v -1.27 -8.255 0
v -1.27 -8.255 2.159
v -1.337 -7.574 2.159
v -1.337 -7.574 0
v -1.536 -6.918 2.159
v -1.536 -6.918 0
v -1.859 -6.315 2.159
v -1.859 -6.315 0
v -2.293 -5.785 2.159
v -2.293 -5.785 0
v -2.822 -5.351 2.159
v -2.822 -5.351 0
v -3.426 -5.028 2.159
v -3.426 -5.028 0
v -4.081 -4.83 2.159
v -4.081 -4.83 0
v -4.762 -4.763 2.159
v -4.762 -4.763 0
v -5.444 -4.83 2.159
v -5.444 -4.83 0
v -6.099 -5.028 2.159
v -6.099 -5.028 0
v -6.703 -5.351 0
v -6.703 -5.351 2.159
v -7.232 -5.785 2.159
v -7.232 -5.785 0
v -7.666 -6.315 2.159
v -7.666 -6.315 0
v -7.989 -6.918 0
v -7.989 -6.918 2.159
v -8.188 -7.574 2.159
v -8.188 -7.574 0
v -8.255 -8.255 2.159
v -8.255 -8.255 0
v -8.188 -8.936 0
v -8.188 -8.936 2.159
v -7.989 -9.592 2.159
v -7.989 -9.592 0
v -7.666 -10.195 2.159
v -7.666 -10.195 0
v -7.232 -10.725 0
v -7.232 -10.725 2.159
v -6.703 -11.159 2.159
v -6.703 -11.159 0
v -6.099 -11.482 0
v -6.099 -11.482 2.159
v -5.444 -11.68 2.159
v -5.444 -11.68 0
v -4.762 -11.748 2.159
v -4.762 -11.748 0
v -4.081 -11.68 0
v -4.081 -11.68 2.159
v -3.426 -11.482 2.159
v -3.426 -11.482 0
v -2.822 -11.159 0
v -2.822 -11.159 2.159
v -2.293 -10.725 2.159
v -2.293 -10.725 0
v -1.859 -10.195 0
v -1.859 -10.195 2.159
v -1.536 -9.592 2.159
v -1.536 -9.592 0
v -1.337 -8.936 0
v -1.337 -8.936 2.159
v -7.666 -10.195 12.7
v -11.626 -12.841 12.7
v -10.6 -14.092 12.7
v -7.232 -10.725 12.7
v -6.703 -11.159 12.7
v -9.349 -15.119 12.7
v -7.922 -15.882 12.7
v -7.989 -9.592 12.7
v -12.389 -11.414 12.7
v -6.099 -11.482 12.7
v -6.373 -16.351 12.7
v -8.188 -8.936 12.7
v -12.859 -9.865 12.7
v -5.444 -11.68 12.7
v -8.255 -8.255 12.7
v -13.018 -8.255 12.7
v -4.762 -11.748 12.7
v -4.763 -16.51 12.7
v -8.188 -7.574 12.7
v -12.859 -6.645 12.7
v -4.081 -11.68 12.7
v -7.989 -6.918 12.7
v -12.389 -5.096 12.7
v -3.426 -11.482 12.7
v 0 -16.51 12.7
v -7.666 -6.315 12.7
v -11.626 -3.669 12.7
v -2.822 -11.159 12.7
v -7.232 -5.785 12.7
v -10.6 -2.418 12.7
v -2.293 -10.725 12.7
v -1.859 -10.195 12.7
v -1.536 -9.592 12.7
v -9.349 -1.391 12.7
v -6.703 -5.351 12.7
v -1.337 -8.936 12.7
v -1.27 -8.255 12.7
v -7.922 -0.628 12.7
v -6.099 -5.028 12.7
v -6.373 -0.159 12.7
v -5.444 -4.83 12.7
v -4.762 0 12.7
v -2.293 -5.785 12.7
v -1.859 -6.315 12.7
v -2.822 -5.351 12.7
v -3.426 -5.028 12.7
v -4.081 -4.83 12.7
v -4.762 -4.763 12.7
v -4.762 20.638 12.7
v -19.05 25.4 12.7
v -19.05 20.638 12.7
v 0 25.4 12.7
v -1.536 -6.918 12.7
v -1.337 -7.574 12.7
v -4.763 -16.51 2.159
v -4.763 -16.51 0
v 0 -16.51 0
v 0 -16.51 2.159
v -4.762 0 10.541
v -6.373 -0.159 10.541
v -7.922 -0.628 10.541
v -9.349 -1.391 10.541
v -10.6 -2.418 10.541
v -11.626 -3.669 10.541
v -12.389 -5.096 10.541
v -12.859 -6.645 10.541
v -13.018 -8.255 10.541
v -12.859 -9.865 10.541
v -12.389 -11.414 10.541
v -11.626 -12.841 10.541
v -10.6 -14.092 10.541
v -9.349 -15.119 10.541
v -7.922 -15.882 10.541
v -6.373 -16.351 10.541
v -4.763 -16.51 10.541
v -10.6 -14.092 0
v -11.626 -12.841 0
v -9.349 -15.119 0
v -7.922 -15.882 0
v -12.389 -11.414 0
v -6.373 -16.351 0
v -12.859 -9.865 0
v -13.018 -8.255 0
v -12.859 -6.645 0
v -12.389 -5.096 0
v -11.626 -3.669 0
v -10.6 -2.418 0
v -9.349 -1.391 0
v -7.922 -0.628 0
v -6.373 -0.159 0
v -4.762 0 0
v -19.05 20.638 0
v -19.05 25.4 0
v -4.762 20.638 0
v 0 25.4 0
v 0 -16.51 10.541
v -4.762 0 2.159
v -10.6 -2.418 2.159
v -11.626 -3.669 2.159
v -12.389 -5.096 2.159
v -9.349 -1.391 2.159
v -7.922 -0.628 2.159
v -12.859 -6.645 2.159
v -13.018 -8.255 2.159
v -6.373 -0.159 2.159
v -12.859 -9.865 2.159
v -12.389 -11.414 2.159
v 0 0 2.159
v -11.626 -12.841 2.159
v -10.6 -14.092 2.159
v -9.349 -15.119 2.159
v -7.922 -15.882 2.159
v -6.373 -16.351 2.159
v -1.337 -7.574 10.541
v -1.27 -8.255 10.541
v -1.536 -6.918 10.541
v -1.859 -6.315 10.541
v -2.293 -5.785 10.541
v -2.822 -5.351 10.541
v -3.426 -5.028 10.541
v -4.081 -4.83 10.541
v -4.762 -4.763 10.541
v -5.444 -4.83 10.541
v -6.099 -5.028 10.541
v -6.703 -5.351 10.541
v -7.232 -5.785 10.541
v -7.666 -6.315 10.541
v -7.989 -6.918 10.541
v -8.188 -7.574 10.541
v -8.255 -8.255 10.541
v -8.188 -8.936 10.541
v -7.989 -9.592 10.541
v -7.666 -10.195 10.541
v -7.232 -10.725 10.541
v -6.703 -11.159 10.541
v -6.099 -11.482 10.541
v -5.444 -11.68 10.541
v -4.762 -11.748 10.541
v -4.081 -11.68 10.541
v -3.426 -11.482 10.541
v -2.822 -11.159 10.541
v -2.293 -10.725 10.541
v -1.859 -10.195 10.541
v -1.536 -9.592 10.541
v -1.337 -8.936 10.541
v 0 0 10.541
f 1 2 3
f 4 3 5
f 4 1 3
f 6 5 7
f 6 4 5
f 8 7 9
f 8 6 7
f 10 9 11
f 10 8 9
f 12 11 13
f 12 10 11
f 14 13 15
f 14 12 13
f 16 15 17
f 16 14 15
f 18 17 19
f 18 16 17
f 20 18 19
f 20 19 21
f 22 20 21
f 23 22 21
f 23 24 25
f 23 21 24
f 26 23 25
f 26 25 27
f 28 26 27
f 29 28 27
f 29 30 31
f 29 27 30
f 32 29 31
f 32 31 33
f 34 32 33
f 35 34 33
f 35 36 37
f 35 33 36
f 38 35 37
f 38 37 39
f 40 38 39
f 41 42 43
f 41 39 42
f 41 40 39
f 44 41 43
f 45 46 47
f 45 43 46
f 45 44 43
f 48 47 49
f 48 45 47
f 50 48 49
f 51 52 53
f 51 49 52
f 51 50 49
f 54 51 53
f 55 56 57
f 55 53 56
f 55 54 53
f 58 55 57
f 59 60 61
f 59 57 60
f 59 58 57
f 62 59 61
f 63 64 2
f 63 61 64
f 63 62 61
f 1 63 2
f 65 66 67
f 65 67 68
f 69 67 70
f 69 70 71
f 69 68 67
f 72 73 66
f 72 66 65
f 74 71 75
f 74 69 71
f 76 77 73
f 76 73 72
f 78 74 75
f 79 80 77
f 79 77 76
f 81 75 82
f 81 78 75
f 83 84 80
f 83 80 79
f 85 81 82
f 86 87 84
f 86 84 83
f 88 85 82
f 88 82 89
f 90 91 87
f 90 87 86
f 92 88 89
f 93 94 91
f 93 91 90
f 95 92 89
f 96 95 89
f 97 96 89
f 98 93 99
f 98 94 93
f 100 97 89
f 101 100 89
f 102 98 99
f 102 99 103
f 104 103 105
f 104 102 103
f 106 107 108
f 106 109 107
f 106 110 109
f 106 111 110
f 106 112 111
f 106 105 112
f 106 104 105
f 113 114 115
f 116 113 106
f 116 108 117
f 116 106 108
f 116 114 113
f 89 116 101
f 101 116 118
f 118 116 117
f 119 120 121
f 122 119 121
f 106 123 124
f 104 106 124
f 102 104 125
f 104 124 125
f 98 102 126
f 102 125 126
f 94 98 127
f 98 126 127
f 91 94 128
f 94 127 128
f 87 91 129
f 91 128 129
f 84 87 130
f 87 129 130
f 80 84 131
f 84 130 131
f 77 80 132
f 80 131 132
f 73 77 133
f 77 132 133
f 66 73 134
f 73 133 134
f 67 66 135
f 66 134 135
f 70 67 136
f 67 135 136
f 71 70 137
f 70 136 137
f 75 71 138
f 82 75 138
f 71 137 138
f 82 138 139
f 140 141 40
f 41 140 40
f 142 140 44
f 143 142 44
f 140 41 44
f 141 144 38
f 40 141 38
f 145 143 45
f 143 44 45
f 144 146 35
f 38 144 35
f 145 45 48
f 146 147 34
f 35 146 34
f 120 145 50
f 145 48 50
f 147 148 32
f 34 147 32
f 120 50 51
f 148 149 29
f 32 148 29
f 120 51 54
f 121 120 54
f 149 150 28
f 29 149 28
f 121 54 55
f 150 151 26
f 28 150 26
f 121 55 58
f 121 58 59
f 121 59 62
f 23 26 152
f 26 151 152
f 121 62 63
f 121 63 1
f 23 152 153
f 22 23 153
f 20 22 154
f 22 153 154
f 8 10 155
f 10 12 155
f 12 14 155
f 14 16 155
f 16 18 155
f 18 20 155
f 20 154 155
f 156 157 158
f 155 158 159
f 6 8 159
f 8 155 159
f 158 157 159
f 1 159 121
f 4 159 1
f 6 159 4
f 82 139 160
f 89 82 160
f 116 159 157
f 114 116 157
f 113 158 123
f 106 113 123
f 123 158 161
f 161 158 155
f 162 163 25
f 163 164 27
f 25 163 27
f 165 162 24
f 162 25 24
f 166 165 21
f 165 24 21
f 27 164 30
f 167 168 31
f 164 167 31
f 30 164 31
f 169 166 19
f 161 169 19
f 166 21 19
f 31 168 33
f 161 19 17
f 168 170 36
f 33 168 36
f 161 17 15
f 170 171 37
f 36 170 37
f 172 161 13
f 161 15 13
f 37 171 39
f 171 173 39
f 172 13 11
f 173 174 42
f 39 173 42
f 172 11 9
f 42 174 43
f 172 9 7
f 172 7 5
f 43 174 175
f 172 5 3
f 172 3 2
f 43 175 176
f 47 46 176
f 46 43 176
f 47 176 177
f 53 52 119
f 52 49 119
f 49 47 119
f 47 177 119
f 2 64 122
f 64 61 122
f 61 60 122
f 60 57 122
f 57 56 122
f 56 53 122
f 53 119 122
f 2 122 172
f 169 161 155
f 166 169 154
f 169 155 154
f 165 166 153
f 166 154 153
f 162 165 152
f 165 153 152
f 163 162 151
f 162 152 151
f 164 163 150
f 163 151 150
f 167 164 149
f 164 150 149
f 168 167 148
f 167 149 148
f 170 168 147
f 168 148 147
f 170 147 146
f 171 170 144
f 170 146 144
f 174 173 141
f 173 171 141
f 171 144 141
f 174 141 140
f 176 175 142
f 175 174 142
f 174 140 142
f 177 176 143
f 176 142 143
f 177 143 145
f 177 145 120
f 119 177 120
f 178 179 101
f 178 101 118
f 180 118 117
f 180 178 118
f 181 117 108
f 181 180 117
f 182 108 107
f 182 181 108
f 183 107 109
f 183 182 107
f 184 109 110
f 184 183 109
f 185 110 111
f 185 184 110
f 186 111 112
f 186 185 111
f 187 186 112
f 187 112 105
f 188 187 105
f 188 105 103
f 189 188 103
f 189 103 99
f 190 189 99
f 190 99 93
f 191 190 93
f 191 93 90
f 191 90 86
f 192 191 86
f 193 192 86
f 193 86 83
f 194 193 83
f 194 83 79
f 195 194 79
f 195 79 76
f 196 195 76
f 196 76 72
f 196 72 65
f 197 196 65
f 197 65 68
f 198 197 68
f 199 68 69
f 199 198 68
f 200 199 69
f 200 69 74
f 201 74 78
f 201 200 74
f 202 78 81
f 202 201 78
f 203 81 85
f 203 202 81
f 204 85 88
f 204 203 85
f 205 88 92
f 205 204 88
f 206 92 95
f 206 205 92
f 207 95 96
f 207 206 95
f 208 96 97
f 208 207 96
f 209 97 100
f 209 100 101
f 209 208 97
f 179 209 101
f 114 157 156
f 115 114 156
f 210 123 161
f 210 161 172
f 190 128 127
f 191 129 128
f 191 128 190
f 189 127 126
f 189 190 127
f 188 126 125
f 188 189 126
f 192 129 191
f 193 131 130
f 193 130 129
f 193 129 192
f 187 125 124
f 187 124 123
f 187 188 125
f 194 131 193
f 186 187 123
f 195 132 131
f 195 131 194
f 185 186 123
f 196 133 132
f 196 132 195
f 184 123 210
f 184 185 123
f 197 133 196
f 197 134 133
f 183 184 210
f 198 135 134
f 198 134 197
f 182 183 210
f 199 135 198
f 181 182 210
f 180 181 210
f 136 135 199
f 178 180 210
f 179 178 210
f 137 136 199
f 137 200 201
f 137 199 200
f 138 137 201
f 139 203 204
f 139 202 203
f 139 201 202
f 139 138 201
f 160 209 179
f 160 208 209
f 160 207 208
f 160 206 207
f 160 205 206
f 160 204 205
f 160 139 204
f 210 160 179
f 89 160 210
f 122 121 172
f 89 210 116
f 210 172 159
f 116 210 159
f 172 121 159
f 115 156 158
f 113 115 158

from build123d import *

# Parameters (mm, degrees)
SKETCH1_R           = 3.4925
BOSS_EXTRUDE1_DEPTH = 12.7
SKETCH2_W           = 25.4
SKETCH2_H           = 8.382
CUT_EXTRUDE1_DEPTH  = 16.51


with BuildPart() as part:
    # Sketch1 → Boss-Extrude1 (new body)
    with BuildSketch(Plane.XY):
        with BuildLine():
            Line((0, 0), (0, 25.4))
            Line((0, 25.4), (-19.05, 25.4))
            Line((-19.05, 25.4), (-19.05, 20.6375))
            Line((-19.05, 20.6375), (-4.7625, 20.6375))
            Line((-4.7625, 20.6375), (-4.7625, 0))
            ThreePointArc((-4.7625, 0), (-13.0175, -8.255), (-4.7625, -16.51))
            Line((-4.7625, -16.51), (0, -16.51))
            Line((0, -16.51), (0, 0))
        make_face()
        with Locations((-4.7625, -8.255)):
            Circle(SKETCH1_R, mode=Mode.SUBTRACT)
    extrude(amount=BOSS_EXTRUDE1_DEPTH)

    # Sketch2 → Cut-Extrude1 (cut)
    with BuildSketch(Plane.XZ.offset(16.51)):
        with Locations((-12.7, 6.35)):
            Rectangle(SKETCH2_W, SKETCH2_H)
    extrude(amount=-CUT_EXTRUDE1_DEPTH, mode=Mode.SUBTRACT)


solid = part.part
